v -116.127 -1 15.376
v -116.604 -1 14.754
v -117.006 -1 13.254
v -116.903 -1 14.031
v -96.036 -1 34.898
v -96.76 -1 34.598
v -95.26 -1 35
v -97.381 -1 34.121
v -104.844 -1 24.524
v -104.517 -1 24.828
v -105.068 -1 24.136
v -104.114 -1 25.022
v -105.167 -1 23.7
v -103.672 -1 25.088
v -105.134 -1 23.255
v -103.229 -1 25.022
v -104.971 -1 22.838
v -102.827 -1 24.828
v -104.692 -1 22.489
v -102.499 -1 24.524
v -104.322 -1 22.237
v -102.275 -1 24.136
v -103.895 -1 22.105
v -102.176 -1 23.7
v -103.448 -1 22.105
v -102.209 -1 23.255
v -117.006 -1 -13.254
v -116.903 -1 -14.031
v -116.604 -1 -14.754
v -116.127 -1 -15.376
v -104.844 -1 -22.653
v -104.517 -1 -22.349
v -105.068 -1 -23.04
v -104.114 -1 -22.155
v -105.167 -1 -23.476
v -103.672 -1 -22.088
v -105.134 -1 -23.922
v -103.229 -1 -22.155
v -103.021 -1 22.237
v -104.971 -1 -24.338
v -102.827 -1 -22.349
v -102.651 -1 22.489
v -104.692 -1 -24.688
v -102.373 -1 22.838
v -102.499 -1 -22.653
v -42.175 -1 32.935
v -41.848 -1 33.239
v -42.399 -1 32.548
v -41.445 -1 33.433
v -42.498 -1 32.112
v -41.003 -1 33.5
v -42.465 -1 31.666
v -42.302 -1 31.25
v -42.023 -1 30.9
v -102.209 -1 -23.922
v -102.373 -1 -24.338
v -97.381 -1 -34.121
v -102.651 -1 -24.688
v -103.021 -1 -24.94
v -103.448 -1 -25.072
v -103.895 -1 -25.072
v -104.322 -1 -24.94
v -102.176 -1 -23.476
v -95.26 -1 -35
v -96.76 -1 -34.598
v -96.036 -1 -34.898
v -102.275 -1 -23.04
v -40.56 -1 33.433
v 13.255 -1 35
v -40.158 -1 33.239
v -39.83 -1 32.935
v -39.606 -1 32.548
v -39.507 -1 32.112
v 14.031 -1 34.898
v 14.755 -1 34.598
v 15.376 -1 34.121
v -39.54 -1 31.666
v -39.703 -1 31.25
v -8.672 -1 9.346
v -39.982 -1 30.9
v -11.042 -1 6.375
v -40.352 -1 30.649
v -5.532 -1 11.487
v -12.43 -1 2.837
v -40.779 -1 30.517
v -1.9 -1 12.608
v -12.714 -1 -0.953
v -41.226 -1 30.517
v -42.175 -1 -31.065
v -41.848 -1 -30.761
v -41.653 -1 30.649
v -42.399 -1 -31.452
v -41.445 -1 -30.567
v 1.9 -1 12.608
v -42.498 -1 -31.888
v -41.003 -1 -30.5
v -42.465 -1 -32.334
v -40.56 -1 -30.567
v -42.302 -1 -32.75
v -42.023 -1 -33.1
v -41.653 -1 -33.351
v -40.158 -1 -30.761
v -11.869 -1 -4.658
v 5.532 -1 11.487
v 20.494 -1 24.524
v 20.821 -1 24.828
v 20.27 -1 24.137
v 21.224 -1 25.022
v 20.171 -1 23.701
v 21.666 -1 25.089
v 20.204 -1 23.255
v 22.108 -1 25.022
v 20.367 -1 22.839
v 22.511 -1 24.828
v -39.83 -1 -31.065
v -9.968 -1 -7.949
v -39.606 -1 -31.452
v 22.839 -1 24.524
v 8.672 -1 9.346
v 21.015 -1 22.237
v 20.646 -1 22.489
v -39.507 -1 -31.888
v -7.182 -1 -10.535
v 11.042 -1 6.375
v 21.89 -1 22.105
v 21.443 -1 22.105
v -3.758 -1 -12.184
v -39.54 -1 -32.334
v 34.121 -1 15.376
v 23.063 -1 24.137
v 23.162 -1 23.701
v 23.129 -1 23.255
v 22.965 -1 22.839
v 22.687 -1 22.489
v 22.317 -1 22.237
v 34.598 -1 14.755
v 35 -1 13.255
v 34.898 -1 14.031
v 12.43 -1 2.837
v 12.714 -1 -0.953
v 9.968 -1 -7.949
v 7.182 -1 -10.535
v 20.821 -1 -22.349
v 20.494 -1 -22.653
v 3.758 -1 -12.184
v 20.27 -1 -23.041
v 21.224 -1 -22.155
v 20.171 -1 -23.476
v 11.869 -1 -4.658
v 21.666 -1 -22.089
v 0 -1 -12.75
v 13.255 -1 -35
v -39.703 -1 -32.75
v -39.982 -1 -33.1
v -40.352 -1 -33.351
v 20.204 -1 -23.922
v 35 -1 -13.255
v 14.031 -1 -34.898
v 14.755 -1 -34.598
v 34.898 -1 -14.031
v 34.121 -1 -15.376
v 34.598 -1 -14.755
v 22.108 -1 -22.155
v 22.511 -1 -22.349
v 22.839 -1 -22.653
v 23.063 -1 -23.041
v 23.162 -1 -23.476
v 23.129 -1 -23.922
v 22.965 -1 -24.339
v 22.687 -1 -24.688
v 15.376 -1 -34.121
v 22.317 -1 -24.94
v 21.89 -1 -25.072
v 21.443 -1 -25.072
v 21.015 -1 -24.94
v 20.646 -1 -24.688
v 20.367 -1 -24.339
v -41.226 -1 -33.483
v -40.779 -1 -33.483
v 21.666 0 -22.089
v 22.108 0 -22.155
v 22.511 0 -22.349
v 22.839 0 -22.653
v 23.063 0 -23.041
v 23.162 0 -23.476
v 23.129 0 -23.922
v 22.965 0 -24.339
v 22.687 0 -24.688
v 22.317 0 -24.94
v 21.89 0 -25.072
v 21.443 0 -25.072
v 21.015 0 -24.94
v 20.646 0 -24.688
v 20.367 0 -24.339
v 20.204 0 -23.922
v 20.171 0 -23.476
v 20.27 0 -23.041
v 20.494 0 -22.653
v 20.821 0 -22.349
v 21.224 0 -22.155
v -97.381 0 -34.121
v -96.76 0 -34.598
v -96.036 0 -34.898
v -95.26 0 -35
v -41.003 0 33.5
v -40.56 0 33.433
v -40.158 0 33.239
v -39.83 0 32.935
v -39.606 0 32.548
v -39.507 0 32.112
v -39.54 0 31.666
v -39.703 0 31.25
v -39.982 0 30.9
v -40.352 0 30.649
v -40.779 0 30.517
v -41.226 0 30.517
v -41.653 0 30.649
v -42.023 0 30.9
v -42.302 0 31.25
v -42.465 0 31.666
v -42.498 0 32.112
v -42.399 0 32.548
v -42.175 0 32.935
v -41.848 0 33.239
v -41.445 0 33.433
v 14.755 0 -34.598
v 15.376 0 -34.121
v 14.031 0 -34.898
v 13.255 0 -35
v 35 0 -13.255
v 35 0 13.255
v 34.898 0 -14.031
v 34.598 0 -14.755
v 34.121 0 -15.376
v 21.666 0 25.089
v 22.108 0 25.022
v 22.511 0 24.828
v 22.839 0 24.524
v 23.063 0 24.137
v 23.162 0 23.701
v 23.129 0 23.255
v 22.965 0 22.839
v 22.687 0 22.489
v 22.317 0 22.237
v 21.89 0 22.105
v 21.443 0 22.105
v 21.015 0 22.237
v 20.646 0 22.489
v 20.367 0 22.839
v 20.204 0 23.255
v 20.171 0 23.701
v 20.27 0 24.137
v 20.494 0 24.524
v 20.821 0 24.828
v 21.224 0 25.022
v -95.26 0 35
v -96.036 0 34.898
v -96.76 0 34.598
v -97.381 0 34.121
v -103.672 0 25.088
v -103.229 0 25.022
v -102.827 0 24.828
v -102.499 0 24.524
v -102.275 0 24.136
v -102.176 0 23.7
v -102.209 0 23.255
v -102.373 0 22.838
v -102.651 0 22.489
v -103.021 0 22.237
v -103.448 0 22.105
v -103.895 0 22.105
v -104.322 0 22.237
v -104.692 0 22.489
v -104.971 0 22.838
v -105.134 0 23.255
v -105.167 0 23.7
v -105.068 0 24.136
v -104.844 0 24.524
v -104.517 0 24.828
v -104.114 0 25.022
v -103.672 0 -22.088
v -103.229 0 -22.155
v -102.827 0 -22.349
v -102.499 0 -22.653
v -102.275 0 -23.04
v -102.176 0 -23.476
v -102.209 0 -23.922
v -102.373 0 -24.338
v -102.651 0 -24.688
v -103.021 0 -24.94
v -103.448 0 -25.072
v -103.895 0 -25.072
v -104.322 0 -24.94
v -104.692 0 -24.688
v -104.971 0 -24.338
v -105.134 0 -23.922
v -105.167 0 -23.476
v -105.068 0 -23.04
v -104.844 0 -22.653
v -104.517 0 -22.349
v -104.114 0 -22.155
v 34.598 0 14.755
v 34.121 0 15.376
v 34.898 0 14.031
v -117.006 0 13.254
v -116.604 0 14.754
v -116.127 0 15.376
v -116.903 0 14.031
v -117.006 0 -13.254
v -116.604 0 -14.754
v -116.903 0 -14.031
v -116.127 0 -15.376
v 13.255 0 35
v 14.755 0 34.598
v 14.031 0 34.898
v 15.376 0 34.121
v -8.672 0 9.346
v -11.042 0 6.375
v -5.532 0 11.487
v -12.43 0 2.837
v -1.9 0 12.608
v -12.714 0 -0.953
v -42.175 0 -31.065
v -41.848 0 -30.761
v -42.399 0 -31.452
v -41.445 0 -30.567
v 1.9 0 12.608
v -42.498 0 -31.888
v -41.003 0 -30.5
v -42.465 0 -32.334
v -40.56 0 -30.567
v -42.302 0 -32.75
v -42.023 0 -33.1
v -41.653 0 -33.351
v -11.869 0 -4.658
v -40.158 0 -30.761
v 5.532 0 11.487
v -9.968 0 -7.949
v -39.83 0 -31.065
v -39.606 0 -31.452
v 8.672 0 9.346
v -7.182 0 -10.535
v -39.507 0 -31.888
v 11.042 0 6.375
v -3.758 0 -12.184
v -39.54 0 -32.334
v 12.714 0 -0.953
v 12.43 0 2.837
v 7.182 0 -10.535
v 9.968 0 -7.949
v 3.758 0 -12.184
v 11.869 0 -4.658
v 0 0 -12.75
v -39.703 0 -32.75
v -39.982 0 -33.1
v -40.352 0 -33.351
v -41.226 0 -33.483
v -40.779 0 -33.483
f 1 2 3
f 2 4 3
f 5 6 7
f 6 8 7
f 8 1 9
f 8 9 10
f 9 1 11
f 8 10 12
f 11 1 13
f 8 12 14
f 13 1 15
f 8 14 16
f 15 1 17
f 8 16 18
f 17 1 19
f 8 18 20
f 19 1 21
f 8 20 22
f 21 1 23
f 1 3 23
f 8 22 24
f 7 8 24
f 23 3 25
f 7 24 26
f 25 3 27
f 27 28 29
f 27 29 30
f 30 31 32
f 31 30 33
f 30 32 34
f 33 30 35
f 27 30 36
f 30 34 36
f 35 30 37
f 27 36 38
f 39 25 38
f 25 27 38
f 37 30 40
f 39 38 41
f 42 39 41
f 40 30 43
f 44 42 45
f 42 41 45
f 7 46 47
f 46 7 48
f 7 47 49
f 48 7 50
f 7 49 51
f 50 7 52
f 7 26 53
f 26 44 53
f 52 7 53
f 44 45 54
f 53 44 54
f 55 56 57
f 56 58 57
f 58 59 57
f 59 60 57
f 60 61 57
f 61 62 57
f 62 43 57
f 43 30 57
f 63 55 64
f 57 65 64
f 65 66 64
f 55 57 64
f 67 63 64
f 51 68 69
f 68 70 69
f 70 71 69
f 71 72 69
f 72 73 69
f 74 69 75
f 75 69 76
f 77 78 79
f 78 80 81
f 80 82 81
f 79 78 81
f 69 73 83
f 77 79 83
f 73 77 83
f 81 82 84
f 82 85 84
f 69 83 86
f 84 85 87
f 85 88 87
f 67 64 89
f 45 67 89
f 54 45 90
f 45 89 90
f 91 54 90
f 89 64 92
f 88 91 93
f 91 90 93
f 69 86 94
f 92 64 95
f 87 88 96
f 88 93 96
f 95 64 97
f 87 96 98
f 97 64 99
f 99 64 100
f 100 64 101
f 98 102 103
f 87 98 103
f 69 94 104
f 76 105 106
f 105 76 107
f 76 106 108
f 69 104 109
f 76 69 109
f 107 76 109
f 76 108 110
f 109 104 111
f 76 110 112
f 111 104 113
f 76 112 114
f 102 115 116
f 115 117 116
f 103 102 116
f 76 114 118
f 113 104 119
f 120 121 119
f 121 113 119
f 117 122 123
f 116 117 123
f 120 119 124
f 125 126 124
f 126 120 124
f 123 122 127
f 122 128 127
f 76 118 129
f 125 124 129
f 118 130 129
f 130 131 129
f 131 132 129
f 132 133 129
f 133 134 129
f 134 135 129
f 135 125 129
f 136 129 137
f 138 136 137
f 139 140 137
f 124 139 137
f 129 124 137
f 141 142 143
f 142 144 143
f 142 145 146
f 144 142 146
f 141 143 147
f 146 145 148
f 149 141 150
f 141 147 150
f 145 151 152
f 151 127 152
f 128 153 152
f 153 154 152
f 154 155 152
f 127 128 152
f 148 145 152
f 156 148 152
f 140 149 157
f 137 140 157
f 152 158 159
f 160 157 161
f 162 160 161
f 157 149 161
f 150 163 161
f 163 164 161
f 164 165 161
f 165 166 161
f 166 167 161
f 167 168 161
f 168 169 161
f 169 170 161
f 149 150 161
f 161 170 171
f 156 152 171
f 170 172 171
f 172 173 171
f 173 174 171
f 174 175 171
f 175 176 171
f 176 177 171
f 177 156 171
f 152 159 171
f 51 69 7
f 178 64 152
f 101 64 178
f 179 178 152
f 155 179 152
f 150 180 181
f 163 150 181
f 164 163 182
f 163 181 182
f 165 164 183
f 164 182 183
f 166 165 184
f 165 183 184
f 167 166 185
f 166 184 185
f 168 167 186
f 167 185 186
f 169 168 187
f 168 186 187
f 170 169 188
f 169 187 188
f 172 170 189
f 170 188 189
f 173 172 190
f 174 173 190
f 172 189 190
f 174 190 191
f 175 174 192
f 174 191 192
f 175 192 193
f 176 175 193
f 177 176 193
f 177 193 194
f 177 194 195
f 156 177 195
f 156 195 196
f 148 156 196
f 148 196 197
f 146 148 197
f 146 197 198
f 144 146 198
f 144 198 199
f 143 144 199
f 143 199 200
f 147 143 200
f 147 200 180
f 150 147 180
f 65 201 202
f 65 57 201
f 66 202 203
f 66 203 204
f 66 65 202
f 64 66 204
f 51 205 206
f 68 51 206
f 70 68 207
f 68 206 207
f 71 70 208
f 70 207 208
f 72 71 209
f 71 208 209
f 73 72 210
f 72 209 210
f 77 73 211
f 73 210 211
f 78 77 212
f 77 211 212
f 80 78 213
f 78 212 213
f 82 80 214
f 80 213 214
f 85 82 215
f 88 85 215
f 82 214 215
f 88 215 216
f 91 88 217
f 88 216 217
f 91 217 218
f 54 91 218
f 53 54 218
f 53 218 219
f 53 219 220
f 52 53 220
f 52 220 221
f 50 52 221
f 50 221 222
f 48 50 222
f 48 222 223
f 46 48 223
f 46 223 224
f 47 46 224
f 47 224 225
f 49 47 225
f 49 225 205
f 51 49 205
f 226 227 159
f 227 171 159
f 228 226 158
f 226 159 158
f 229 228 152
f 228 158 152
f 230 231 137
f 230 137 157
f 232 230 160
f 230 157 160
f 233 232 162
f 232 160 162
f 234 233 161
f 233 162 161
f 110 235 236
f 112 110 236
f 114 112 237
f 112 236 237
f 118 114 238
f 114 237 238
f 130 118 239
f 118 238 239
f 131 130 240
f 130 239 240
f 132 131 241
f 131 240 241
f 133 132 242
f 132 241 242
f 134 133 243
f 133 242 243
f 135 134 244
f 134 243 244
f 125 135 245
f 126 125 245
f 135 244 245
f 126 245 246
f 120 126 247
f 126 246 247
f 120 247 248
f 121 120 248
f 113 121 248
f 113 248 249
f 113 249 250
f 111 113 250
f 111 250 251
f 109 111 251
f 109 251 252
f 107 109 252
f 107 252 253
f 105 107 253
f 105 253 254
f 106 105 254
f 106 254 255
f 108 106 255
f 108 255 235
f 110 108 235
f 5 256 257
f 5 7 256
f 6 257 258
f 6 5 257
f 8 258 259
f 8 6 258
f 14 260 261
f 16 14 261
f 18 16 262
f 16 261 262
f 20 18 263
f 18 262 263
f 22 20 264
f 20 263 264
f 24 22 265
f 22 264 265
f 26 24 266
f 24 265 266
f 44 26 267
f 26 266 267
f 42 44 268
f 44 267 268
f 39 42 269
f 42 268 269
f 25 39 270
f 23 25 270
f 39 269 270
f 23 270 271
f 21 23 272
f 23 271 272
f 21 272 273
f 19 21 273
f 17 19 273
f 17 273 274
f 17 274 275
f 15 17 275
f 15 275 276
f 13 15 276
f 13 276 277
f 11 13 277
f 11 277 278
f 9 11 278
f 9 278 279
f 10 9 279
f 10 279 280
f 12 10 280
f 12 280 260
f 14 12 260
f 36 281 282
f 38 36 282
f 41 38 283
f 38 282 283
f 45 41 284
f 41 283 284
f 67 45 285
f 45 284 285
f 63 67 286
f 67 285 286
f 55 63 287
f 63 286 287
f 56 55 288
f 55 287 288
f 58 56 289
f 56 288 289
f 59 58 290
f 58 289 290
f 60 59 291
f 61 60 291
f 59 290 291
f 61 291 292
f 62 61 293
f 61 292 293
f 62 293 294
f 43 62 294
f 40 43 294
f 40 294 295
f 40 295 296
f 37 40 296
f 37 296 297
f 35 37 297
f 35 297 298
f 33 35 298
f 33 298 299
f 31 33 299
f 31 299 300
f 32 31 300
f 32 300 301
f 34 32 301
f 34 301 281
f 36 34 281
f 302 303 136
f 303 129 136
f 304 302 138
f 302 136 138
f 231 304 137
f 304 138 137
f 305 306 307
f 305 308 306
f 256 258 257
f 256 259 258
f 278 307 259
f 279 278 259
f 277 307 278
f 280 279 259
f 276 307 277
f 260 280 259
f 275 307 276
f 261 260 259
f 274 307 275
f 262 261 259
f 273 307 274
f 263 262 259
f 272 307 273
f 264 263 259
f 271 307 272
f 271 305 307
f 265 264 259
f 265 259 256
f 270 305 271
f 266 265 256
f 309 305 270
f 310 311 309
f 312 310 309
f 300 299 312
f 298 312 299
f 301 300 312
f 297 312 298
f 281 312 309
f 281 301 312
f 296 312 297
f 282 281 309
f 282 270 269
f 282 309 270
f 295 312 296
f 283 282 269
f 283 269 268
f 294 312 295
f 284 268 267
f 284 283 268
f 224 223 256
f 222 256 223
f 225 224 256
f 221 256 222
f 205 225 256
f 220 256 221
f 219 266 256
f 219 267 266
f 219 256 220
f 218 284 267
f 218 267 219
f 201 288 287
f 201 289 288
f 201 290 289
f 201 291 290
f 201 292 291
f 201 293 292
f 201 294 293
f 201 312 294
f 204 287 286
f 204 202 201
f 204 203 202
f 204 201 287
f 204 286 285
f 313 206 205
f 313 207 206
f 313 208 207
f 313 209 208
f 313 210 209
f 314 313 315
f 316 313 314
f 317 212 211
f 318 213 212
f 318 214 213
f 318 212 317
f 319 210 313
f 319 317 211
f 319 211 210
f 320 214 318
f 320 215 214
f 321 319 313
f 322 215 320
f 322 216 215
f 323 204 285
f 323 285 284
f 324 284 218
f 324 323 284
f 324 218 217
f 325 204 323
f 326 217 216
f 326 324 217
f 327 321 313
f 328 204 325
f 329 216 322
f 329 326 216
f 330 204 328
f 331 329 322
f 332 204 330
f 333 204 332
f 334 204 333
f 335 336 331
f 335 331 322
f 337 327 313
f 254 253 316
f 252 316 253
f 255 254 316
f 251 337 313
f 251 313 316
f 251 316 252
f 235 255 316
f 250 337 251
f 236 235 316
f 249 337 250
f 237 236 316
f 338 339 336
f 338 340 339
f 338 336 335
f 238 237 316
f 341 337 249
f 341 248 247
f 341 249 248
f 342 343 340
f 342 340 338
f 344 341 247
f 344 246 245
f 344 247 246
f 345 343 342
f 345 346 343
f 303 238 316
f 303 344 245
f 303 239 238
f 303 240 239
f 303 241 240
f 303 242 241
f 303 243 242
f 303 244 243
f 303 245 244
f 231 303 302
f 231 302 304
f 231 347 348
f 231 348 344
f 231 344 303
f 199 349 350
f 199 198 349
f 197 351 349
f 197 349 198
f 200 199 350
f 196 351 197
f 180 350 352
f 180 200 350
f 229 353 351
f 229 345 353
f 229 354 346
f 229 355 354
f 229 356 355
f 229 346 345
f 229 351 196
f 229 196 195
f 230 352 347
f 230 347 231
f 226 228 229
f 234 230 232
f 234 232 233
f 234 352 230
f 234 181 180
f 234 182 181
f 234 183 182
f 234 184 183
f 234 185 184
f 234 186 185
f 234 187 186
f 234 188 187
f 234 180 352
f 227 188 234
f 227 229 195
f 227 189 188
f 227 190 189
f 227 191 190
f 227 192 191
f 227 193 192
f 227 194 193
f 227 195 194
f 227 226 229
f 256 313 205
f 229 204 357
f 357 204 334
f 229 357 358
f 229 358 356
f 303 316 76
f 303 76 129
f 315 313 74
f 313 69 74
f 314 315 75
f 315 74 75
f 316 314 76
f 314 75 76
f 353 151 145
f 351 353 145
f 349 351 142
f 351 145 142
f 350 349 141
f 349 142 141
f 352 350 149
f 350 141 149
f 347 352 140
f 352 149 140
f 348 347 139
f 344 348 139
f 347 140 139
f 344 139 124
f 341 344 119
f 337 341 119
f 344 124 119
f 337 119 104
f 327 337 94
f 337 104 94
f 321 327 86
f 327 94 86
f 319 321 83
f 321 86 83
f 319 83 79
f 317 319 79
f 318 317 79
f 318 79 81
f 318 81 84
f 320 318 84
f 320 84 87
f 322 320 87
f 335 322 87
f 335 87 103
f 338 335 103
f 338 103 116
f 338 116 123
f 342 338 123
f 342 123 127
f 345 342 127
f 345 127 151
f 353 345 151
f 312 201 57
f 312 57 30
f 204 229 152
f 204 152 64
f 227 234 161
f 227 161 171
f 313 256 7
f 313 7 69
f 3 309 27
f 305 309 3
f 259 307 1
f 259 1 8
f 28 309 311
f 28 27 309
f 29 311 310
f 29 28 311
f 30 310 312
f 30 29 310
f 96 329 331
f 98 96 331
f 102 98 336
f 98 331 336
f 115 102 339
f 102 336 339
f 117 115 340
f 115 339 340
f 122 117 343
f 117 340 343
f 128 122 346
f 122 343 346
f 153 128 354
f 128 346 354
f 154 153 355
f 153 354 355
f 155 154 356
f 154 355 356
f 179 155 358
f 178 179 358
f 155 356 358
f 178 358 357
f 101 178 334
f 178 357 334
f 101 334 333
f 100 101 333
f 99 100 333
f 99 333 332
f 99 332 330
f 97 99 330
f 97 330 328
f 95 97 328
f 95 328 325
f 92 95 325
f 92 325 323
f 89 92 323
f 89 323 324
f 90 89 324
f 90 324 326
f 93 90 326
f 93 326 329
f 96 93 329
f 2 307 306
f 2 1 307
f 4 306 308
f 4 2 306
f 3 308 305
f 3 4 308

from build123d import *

# Parameters (mm, degrees)
SM_BASE_FLANGE_1_DEPTH = 1
SKETCH_2_R             = 1.5
CUT_EXTRUDE_1_DEPTH    = 10
FILLET_1_R             = 3
SKETCH_3_R             = 12.75
CUT_EXTRUDE_2_DEPTH    = 10


# Sheet-metal steps are written as plain solids
with BuildPart() as part:
    # Sketch 1 → Базовая кромка1 (new body)
    with BuildSketch(Plane(origin=(0, 0, 0), x_dir=(1, 0, 0), z_dir=(0, 1, 0))):
        Polygon((-96.502525317, -35), (14.497474683, -35), (35, -14.497474683), (35, 14.497474683), (14.497474683, 35), (-96.502525317, 35), (-117.005525317, 14.497), (-117.005525317, 0), (-117.005525317, -14.497), align=None)
    extrude(amount=-SM_BASE_FLANGE_1_DEPTH)

    # Эскиз2 → Вырез-Вытянуть1 (cut)
    with BuildSketch(Plane(origin=(0, 0, 0), x_dir=(1, 0, 0), z_dir=(0, 1, 0))):
        with Locations(Location((-103.671600061, 23.588284569, 0), (0, 0, 270))):
            Circle(SKETCH_2_R)
        with Locations(Location((-41.002525317, 32, 0), (0, 0, 270))):
            Circle(SKETCH_2_R)
        with Locations(Location((21.666312086, 23.58852191, 0), (0, 0, 270))):
            Circle(SKETCH_2_R)
        with Locations(Location((21.666312086, -23.58852191, 0), (0, 0, 270))):
            Circle(SKETCH_2_R)
        with Locations(Location((-103.671600061, -23.588284569, 0), (0, 0, 270))):
            Circle(SKETCH_2_R)
        with Locations(Location((-41.002525317, -32, 0), (0, 0, 270))):
            Circle(SKETCH_2_R)
    extrude(amount=-CUT_EXTRUDE_1_DEPTH, mode=Mode.SUBTRACT)

    # Скругление1
    fillet_1_edges = [part.edges().sort_by_distance(p)[0] for p in [
        (-117.005525317, -0.5, 14.497),
        (-117.005525317, -0.5, -14.497),
        (-96.502525317, -0.5, -35),
        (14.497474683, -0.5, -35),
        (35, -0.5, -14.497474683),
        (35, -0.5, 14.497474683),
        (14.497474683, -0.5, 35),
        (-96.502525317, -0.5, 35),
    ]]
    fillet(fillet_1_edges, radius=FILLET_1_R)

    # Эскиз3 → Вырез-Вытянуть2 (cut)
    with BuildSketch(Plane.XZ.offset(1)):
        with Locations(Location((0, 0, 0), (0, 0, 270))):
            Circle(SKETCH_3_R)
    extrude(amount=-CUT_EXTRUDE_2_DEPTH, mode=Mode.SUBTRACT)


solid = part.part
